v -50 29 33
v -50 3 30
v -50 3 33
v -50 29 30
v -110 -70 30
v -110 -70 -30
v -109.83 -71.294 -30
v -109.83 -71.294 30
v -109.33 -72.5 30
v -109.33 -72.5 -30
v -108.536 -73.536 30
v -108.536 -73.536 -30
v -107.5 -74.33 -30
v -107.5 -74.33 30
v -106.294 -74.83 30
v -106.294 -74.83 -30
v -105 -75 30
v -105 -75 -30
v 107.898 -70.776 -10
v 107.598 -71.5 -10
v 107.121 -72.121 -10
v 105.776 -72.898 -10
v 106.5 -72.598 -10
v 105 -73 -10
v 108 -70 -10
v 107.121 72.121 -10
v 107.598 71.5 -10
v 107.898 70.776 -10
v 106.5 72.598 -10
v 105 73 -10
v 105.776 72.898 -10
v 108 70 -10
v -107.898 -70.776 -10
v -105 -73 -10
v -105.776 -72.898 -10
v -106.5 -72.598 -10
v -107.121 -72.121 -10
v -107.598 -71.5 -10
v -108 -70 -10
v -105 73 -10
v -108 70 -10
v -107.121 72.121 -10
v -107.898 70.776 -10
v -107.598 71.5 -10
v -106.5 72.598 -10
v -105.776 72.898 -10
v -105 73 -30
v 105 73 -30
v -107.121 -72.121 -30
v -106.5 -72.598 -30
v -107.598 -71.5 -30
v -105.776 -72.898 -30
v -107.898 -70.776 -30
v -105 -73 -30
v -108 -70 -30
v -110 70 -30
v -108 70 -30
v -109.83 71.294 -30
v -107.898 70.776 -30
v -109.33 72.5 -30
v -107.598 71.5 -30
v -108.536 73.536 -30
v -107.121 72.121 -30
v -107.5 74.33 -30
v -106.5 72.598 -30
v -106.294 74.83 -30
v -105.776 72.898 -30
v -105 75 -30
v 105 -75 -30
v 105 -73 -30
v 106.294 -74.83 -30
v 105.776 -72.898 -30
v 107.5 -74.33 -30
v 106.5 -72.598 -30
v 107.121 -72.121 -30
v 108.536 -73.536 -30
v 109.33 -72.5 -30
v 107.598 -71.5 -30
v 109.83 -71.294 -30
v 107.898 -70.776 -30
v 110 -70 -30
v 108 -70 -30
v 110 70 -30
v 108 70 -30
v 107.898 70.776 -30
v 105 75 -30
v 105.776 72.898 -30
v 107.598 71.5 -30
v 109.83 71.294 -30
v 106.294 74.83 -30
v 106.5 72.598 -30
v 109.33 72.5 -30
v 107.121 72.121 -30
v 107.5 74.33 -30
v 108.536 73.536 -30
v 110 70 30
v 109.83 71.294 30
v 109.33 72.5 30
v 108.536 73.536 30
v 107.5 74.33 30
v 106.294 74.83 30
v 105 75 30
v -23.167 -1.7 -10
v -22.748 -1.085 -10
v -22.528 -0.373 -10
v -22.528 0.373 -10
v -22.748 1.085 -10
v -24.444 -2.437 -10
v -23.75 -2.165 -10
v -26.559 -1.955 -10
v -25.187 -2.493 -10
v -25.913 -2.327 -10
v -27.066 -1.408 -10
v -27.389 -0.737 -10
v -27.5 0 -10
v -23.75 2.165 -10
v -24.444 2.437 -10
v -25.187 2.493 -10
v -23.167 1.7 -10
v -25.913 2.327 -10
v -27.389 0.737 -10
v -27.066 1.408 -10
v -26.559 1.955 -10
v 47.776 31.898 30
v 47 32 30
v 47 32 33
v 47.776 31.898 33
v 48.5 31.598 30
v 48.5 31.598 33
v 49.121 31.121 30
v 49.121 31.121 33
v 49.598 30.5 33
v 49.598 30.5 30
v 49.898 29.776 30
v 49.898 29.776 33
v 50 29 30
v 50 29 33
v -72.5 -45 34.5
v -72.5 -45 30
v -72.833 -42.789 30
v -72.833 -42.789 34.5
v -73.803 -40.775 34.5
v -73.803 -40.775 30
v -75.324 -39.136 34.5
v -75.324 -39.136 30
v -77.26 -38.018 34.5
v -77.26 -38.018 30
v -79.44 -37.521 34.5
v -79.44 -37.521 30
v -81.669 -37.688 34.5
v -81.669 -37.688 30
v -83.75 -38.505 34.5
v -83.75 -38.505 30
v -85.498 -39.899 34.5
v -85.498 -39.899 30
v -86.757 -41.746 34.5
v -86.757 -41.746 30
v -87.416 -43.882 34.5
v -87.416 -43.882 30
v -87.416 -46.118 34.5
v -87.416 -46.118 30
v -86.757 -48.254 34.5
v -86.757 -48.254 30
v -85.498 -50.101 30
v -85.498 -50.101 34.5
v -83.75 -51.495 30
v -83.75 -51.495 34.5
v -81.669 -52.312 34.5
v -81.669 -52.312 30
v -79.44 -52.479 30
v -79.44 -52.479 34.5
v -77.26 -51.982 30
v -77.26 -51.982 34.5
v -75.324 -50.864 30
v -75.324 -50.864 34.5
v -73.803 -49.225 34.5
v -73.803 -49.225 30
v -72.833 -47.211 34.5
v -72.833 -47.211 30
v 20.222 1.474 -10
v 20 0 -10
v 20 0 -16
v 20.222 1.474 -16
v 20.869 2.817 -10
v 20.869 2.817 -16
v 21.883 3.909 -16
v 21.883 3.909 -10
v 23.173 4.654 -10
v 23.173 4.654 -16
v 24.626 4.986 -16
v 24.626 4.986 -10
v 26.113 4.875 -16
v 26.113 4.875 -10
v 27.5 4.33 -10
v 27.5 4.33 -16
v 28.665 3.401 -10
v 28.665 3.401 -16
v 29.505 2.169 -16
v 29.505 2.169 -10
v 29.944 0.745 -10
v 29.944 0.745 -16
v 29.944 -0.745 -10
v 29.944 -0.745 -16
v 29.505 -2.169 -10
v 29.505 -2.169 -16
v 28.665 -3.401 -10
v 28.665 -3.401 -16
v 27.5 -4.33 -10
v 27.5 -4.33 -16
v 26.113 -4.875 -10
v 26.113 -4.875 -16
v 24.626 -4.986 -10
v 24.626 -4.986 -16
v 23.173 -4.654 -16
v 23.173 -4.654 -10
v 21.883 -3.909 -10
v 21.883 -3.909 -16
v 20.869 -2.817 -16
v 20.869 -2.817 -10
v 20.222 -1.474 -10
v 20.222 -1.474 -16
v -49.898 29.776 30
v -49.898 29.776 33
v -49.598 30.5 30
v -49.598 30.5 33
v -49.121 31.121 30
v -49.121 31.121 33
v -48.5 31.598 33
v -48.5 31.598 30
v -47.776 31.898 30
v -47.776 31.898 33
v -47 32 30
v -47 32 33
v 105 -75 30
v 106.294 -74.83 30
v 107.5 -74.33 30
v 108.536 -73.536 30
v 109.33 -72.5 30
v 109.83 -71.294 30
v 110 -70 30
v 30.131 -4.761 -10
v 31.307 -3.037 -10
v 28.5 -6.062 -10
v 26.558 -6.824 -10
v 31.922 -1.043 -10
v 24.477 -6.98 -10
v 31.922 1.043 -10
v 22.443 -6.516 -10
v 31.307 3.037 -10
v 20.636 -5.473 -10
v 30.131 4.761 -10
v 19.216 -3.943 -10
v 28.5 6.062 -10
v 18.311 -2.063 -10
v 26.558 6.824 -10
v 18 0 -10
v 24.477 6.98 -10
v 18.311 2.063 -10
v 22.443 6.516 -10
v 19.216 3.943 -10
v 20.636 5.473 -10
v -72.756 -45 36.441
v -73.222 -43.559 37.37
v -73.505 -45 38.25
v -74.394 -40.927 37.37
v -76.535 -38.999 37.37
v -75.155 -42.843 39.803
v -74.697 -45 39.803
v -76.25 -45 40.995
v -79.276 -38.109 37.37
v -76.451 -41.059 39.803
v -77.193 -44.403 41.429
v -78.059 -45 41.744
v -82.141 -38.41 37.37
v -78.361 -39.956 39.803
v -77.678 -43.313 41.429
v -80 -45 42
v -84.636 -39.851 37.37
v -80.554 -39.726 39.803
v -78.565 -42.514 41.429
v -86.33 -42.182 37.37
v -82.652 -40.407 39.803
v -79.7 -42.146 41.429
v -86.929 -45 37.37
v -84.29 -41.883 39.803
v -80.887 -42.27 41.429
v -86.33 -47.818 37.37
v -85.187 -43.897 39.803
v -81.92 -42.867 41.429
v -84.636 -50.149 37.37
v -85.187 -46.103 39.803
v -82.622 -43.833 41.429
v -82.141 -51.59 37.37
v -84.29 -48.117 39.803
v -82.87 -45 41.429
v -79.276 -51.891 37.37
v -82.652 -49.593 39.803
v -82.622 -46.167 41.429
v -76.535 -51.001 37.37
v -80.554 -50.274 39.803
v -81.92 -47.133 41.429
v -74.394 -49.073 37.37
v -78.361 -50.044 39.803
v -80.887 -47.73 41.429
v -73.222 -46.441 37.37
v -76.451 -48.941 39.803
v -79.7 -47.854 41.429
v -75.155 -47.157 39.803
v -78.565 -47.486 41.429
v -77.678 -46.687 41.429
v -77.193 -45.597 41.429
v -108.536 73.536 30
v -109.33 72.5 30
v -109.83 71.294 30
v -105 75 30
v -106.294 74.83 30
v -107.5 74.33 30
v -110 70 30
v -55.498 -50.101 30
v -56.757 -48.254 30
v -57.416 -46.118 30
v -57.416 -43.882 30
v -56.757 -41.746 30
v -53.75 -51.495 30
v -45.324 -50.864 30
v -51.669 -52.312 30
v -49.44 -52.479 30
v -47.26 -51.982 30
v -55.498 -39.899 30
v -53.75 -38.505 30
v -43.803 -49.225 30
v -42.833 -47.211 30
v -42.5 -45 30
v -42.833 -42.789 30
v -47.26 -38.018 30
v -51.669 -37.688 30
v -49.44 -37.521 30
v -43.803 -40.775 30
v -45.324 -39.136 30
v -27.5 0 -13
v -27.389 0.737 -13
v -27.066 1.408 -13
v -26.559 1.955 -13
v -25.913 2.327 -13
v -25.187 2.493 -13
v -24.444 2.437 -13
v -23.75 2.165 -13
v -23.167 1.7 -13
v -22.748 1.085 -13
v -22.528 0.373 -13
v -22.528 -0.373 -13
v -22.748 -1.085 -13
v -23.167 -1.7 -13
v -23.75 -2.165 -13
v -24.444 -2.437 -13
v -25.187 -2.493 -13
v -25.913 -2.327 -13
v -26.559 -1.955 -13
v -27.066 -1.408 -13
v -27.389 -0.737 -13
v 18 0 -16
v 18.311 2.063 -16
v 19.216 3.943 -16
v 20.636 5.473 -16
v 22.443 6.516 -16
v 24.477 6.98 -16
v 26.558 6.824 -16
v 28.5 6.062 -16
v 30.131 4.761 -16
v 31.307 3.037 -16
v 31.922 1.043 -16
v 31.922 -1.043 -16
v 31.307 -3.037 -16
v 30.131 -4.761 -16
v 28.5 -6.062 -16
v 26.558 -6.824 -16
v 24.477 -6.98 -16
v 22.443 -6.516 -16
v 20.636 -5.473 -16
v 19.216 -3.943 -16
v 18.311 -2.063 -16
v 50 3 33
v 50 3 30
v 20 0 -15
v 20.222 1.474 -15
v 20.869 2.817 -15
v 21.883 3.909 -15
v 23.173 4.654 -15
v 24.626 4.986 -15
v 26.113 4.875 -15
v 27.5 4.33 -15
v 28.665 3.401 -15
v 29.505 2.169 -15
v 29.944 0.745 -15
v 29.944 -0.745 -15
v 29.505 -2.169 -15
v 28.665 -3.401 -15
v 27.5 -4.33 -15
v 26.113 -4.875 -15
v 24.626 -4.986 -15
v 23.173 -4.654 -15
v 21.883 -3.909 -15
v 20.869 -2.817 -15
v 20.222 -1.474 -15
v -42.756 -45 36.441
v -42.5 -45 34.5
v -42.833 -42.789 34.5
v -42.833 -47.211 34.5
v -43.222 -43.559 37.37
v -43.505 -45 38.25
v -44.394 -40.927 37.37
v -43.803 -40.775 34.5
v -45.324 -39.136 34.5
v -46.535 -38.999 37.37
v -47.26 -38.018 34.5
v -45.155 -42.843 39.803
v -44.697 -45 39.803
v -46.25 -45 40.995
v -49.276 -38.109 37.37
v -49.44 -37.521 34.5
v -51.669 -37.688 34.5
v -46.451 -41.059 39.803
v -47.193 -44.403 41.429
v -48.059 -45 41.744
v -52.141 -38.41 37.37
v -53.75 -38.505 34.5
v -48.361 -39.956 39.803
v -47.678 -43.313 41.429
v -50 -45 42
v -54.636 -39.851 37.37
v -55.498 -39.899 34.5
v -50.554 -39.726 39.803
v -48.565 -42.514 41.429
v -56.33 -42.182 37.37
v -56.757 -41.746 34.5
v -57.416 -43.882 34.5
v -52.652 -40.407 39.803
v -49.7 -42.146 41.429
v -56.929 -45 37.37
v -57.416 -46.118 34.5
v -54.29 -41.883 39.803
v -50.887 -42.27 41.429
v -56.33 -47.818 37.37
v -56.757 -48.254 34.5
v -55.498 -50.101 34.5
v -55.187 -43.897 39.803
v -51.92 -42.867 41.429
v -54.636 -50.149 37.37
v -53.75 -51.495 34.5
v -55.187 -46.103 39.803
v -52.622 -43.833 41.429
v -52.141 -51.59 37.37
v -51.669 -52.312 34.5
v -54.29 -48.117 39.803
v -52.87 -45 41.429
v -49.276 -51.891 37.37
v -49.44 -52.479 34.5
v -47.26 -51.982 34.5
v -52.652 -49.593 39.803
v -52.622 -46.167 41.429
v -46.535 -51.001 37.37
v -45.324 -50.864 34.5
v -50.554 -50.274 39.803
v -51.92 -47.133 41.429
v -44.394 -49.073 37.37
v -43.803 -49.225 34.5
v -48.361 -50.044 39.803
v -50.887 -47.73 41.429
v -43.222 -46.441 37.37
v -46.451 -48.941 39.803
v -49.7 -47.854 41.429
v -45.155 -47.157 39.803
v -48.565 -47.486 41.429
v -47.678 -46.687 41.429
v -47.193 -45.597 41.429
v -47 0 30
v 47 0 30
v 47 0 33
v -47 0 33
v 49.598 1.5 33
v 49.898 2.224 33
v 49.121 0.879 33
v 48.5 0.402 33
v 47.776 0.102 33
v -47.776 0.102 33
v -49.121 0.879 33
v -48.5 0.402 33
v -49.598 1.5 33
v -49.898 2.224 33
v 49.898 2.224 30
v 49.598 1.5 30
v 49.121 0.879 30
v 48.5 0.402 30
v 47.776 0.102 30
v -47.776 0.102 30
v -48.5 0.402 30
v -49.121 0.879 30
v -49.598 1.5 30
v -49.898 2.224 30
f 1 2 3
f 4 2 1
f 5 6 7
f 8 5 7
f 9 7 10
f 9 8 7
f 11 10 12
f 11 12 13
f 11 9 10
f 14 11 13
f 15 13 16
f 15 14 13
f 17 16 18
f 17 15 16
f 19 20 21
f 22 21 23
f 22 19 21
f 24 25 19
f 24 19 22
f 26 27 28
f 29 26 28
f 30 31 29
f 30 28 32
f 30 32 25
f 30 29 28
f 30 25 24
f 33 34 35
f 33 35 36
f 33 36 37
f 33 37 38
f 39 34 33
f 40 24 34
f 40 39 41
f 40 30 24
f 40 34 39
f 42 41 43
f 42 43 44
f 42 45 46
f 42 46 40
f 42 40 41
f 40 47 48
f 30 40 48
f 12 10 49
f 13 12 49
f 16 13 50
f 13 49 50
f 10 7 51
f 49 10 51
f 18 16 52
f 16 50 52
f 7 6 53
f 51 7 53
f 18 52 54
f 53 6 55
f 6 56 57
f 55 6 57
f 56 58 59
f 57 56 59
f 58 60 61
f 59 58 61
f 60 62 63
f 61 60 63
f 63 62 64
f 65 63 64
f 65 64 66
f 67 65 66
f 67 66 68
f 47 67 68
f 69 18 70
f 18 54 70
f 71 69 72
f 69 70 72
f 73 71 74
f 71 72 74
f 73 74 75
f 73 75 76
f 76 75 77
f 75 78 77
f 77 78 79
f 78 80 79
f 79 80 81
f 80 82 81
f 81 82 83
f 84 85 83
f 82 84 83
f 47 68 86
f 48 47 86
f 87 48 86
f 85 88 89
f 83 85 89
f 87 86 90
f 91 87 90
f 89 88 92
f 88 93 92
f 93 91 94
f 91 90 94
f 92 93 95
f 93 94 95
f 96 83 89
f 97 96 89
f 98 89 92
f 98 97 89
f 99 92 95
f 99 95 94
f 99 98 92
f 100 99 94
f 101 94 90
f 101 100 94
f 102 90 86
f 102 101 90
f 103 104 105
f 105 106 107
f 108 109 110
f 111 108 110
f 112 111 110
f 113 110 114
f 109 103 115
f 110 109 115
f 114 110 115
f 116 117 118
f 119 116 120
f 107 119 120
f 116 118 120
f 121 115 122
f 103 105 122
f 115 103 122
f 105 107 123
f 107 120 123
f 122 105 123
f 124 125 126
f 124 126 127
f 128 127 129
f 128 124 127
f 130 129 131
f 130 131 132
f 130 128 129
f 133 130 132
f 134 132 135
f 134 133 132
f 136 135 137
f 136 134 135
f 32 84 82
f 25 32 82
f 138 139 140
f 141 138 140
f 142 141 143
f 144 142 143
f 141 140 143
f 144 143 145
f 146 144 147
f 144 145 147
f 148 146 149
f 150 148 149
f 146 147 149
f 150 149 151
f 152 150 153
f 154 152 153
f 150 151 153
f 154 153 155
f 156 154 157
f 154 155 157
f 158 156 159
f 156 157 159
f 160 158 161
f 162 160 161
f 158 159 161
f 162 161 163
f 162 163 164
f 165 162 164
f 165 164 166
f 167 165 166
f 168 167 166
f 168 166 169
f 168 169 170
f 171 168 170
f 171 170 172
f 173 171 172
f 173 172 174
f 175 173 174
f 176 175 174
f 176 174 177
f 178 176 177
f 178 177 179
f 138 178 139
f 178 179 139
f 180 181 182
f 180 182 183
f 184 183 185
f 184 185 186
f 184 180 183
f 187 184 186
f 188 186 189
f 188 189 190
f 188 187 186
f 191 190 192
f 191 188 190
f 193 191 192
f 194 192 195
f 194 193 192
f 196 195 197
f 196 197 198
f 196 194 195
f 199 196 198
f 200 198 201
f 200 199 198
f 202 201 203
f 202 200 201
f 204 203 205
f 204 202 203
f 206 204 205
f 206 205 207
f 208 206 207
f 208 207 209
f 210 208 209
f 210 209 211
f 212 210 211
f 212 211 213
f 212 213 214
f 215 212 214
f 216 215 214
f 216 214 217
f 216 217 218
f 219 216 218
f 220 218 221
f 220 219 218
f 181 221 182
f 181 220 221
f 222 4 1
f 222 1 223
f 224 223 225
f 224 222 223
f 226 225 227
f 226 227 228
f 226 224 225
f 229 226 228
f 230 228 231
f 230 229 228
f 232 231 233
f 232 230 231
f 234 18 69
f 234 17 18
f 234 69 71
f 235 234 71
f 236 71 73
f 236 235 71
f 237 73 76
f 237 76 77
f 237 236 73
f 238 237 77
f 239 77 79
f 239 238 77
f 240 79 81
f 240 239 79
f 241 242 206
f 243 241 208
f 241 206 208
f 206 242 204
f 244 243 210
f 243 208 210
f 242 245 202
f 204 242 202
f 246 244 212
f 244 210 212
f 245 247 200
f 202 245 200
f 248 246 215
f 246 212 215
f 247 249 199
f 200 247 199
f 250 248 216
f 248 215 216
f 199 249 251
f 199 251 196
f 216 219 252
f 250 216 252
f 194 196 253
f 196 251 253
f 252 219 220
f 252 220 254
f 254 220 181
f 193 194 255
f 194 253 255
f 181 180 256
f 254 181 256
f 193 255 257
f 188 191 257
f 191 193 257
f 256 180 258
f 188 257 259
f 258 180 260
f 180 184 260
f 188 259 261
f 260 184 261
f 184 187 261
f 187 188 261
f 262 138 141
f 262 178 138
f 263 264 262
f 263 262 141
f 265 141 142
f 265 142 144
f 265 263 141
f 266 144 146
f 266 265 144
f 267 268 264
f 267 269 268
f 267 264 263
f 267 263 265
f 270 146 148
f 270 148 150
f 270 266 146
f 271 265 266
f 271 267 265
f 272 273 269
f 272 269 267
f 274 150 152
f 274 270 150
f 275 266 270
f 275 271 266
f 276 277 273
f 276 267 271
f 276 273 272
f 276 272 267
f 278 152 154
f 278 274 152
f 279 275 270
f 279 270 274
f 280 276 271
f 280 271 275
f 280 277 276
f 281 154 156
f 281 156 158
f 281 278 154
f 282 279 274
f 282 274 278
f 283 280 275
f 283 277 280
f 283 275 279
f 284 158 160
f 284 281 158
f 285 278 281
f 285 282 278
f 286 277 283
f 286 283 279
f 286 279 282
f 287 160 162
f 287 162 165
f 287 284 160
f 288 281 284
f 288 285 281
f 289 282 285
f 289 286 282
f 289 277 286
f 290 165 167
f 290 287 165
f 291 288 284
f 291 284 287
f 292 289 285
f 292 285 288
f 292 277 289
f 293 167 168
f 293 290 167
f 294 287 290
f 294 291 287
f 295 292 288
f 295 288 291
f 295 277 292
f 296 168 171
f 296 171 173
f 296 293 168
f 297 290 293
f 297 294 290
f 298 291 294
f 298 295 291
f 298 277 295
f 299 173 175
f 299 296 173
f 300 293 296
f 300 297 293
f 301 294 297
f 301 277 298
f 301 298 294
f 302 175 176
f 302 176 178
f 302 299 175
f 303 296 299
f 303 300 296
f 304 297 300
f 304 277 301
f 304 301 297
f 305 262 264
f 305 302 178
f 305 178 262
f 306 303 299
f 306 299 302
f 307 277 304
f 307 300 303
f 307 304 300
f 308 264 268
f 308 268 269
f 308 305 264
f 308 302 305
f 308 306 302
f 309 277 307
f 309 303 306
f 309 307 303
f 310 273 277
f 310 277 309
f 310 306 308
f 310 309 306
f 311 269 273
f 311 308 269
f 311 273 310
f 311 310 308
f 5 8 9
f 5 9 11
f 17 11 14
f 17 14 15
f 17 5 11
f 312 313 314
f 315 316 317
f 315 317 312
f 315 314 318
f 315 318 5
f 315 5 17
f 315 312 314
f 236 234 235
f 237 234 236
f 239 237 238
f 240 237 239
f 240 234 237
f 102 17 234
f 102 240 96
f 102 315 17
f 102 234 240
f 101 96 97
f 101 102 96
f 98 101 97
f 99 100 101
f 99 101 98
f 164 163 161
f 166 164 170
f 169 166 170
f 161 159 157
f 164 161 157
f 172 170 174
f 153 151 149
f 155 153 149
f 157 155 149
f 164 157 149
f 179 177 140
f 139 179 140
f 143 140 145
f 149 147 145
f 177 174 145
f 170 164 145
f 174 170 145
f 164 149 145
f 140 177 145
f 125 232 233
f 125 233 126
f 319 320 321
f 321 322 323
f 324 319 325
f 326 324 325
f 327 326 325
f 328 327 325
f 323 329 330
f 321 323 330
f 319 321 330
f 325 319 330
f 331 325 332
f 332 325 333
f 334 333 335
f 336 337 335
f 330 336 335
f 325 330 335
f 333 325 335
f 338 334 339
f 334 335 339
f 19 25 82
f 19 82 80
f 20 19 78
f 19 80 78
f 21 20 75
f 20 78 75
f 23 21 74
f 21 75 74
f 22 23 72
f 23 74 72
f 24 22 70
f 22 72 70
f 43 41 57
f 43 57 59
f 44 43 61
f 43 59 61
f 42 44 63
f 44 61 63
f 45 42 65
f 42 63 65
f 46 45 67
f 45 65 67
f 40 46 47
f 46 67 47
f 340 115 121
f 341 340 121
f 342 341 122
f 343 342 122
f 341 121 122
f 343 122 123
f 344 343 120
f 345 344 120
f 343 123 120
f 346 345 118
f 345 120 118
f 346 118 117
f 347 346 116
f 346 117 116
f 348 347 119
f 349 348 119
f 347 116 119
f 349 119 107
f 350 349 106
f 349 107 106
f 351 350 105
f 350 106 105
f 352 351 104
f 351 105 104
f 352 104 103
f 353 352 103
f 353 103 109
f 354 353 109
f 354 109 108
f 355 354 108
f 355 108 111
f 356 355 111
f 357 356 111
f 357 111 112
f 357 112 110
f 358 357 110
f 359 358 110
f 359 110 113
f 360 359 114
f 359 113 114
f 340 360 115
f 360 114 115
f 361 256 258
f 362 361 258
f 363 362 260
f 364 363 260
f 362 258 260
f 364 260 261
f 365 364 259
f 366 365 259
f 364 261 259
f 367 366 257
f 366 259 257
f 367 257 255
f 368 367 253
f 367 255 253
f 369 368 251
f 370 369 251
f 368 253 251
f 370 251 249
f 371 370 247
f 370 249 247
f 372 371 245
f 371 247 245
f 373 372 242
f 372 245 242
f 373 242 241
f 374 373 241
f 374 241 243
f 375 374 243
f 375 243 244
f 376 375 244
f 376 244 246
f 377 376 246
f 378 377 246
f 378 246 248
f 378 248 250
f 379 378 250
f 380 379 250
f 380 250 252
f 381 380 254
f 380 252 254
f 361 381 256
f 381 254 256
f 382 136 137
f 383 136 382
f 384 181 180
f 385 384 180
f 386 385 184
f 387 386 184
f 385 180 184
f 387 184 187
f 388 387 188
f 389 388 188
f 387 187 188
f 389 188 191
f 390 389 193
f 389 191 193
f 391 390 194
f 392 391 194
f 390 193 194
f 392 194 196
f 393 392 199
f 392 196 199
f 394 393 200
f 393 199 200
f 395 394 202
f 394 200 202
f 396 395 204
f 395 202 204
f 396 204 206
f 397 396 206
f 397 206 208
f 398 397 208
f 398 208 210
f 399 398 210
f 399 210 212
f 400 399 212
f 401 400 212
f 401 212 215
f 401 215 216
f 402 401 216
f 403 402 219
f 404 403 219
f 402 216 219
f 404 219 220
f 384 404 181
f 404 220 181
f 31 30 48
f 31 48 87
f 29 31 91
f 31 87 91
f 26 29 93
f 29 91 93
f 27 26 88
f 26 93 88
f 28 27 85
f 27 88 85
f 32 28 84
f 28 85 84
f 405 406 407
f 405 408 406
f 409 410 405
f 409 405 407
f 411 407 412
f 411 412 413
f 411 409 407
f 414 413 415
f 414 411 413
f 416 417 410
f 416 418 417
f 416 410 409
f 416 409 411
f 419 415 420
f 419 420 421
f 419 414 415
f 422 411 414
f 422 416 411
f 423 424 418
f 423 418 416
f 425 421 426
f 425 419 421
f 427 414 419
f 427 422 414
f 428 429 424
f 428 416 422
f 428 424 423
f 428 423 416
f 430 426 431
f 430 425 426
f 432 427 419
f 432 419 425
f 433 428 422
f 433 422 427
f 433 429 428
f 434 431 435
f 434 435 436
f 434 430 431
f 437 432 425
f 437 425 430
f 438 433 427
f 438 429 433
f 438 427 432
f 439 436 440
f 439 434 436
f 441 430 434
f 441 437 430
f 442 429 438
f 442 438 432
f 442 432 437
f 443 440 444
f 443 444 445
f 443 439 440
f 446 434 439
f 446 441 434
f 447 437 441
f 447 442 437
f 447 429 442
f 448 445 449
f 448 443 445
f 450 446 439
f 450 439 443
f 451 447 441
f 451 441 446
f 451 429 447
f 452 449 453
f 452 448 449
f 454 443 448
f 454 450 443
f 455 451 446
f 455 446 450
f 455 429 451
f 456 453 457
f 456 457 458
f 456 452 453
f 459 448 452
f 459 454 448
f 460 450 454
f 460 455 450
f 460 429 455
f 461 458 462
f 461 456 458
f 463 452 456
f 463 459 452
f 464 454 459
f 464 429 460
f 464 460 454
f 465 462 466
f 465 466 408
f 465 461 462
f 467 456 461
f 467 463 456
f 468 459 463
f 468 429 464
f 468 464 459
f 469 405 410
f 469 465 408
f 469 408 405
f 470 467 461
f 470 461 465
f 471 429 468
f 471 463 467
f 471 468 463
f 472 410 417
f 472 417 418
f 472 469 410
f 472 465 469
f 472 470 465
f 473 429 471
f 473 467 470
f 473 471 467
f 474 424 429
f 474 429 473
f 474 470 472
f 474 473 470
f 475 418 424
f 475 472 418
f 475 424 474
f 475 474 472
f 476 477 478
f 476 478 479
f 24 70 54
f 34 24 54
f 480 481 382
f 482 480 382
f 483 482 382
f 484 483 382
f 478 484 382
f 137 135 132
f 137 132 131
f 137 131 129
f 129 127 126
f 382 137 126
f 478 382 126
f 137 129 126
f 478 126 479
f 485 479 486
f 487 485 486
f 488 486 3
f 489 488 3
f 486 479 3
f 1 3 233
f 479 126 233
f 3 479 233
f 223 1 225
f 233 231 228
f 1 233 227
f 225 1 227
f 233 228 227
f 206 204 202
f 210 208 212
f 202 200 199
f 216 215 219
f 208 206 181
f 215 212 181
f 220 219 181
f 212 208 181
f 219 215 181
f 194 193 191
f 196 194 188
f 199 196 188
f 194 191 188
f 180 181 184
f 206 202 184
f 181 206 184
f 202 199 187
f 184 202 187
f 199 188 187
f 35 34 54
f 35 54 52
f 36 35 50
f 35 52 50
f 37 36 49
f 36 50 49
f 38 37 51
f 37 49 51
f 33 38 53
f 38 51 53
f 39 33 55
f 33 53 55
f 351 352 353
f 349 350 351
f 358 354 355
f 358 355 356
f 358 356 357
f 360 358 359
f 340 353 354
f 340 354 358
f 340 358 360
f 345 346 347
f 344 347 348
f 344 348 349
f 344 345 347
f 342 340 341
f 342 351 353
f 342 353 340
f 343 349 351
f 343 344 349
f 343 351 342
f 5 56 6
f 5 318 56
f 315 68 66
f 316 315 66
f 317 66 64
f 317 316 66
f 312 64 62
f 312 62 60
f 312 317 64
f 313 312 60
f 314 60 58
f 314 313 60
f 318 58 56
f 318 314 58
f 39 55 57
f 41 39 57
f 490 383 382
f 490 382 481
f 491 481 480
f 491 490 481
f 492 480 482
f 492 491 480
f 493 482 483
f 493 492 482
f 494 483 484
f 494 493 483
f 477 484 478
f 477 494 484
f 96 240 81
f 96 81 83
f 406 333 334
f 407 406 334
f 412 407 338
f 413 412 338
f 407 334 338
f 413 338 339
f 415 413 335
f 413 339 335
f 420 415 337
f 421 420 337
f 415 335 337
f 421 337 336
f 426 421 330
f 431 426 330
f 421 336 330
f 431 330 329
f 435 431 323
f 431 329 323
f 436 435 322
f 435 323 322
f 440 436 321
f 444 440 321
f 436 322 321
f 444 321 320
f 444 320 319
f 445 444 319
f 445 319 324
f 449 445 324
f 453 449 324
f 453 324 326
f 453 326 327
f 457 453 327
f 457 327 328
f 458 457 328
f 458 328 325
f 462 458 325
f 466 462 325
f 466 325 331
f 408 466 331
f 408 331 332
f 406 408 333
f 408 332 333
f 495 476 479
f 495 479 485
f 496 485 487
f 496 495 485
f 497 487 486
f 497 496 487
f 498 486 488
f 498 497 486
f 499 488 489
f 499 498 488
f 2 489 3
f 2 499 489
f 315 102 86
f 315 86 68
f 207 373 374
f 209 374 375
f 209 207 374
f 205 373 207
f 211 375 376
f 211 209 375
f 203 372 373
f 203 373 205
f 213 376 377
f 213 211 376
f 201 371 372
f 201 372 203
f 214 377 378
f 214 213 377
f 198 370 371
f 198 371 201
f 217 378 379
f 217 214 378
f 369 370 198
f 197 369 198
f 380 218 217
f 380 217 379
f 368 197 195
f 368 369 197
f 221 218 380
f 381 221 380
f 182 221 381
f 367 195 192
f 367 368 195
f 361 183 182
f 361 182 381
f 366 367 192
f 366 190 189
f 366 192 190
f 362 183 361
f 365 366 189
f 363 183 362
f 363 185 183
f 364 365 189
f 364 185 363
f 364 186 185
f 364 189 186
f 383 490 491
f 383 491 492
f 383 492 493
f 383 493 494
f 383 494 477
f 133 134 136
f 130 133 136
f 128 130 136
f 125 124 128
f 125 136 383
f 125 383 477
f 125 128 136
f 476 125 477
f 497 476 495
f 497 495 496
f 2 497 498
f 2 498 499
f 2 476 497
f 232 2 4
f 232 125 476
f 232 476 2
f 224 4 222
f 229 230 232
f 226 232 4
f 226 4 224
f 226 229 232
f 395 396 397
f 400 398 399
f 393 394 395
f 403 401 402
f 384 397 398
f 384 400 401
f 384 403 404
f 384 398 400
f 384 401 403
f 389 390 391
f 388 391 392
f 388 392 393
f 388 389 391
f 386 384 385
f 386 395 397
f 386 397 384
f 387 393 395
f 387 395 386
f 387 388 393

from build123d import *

# Parameters (mm, degrees)
BOSS_EXTRUDE1_DEPTH   = 30
CUT_EXTRUDE1_DEPTH    = 20
SKETCH3_R             = 2.5
BOSS_EXTRUDE2_DEPTH   = 3
SKETCH3_3_R           = 5
BOSS_EXTRUDE3_DEPTH   = 5
SKETCH3_4_R           = 7
SKETCH3_4_R_2         = 5
BOSS_EXTRUDE4_DEPTH   = 6
BOSS_EXTRUDE5_DEPTH   = 3
SKETCH5_R             = 7.5
BOSS_EXTRUDE6_DEPTH   = 12
BOSS_EXTRUDE6_2_DEPTH = 12
FILLET2_R             = 7.5
FILLET3_R             = 7.5


with BuildPart() as part:
    # Sketch1 → Boss-Extrude1 (new, symmetric)
    with BuildSketch(Plane.XY):
        with BuildLine():
            Line((-105, -75), (105, -75))
            ThreePointArc((105, -75), (108.535533906, -73.535533906), (110, -70))
            Line((110, -70), (110, 70))
            ThreePointArc((110, 70), (108.535533906, 73.535533906), (105, 75))
            Line((105, 75), (-105, 75))
            ThreePointArc((-105, 75), (-108.535533906, 73.535533906), (-110, 70))
            Line((-110, 70), (-110, -70))
            ThreePointArc((-110, -70), (-108.535533906, -73.535533906), (-105, -75))
        make_face()
    extrude(amount=BOSS_EXTRUDE1_DEPTH, both=True)

    # Sketch2 → Cut-Extrude1 (cut)
    with BuildSketch(Plane(origin=(0, 0, -30), x_dir=(-1, 0, 0), z_dir=(0, 0, -1))):
        with BuildLine():
            Line((-105, -73), (105, -73))
            ThreePointArc((105, -73), (107.121320344, -72.121320344), (108, -70))
            Line((108, -70), (108, 70))
            ThreePointArc((108, 70), (107.121320344, 72.121320344), (105, 73))
            Line((105, 73), (-105, 73))
            ThreePointArc((-105, 73), (-107.121320344, 72.121320344), (-108, 70))
            Line((-108, 70), (-108, -70))
            ThreePointArc((-108, -70), (-107.121320344, -72.121320344), (-105, -73))
        make_face()
    extrude(amount=-CUT_EXTRUDE1_DEPTH, mode=Mode.SUBTRACT)


with BuildPart() as body_2:
    # Sketch3 → Boss-Extrude2 (new body)
    with BuildSketch(Plane(origin=(0, 0, -10), x_dir=(-1, 0, 0), z_dir=(0, 0, -1))):
        with Locations((25, 0)):
            Circle(SKETCH3_R)
    extrude(amount=BOSS_EXTRUDE2_DEPTH)


with BuildPart() as body_3:
    # Sketch3<3> → Boss-Extrude3 (new body)
    with BuildSketch(Plane(origin=(0, 0, -10), x_dir=(-1, 0, 0), z_dir=(0, 0, -1))):
        with Locations((-25, 0)):
            Circle(SKETCH3_3_R)
    extrude(amount=BOSS_EXTRUDE3_DEPTH)


with BuildPart() as body_4:
    # Sketch3<4> → Boss-Extrude4 (new body)
    with BuildSketch(Plane(origin=(0, 0, -10), x_dir=(-1, 0, 0), z_dir=(0, 0, -1))):
        with Locations((-25, 0)):
            Circle(SKETCH3_4_R)
        with Locations((-25, 0)):
            Circle(SKETCH3_4_R_2, mode=Mode.SUBTRACT)
    extrude(amount=BOSS_EXTRUDE4_DEPTH)


with BuildPart() as body_5:
    # Sketch4 → Boss-Extrude5 (new body)
    with BuildSketch(Plane.XY.offset(30)):
        with BuildLine():
            Line((-47, 32), (47, 32))
            ThreePointArc((47, 32), (49.121320344, 31.121320344), (50, 29))
            Line((50, 29), (50, 3))
            ThreePointArc((50, 3), (49.121320344, 0.878679656), (47, 0))
            Line((47, 0), (-47, 0))
            ThreePointArc((-47, 0), (-49.121320344, 0.878679656), (-50, 3))
            Line((-50, 3), (-50, 29))
            ThreePointArc((-50, 29), (-49.121320344, 31.121320344), (-47, 32))
        make_face()
    extrude(amount=BOSS_EXTRUDE5_DEPTH)


with BuildPart() as body_6:
    # Sketch5 → Boss-Extrude6 (new body)
    with BuildSketch(Plane.XY.offset(30)):
        with Locations((-80, -45)):
            Circle(SKETCH5_R)
    extrude(amount=BOSS_EXTRUDE6_DEPTH)

    # Fillet2
    fillet2_edges = [body_6.edges().sort_by_distance(p)[0] for p in [
        (-87.5, -45, 42),
    ]]
    fillet(fillet2_edges, radius=FILLET2_R)


with BuildPart() as body_7:
    # Sketch5 → Boss-Extrude6 2 (new body)
    with BuildSketch(Plane.XY.offset(30)):
        with Locations((-50, -45)):
            Circle(SKETCH5_R)
    extrude(amount=BOSS_EXTRUDE6_2_DEPTH)

    # Fillet3
    fillet3_edges = [body_7.edges().sort_by_distance(p)[0] for p in [
        (-57.5, -45, 42),
    ]]
    fillet(fillet3_edges, radius=FILLET3_R)


solid = Compound([part.part, body_2.part, body_3.part, body_4.part, body_5.part, body_6.part, body_7.part])
